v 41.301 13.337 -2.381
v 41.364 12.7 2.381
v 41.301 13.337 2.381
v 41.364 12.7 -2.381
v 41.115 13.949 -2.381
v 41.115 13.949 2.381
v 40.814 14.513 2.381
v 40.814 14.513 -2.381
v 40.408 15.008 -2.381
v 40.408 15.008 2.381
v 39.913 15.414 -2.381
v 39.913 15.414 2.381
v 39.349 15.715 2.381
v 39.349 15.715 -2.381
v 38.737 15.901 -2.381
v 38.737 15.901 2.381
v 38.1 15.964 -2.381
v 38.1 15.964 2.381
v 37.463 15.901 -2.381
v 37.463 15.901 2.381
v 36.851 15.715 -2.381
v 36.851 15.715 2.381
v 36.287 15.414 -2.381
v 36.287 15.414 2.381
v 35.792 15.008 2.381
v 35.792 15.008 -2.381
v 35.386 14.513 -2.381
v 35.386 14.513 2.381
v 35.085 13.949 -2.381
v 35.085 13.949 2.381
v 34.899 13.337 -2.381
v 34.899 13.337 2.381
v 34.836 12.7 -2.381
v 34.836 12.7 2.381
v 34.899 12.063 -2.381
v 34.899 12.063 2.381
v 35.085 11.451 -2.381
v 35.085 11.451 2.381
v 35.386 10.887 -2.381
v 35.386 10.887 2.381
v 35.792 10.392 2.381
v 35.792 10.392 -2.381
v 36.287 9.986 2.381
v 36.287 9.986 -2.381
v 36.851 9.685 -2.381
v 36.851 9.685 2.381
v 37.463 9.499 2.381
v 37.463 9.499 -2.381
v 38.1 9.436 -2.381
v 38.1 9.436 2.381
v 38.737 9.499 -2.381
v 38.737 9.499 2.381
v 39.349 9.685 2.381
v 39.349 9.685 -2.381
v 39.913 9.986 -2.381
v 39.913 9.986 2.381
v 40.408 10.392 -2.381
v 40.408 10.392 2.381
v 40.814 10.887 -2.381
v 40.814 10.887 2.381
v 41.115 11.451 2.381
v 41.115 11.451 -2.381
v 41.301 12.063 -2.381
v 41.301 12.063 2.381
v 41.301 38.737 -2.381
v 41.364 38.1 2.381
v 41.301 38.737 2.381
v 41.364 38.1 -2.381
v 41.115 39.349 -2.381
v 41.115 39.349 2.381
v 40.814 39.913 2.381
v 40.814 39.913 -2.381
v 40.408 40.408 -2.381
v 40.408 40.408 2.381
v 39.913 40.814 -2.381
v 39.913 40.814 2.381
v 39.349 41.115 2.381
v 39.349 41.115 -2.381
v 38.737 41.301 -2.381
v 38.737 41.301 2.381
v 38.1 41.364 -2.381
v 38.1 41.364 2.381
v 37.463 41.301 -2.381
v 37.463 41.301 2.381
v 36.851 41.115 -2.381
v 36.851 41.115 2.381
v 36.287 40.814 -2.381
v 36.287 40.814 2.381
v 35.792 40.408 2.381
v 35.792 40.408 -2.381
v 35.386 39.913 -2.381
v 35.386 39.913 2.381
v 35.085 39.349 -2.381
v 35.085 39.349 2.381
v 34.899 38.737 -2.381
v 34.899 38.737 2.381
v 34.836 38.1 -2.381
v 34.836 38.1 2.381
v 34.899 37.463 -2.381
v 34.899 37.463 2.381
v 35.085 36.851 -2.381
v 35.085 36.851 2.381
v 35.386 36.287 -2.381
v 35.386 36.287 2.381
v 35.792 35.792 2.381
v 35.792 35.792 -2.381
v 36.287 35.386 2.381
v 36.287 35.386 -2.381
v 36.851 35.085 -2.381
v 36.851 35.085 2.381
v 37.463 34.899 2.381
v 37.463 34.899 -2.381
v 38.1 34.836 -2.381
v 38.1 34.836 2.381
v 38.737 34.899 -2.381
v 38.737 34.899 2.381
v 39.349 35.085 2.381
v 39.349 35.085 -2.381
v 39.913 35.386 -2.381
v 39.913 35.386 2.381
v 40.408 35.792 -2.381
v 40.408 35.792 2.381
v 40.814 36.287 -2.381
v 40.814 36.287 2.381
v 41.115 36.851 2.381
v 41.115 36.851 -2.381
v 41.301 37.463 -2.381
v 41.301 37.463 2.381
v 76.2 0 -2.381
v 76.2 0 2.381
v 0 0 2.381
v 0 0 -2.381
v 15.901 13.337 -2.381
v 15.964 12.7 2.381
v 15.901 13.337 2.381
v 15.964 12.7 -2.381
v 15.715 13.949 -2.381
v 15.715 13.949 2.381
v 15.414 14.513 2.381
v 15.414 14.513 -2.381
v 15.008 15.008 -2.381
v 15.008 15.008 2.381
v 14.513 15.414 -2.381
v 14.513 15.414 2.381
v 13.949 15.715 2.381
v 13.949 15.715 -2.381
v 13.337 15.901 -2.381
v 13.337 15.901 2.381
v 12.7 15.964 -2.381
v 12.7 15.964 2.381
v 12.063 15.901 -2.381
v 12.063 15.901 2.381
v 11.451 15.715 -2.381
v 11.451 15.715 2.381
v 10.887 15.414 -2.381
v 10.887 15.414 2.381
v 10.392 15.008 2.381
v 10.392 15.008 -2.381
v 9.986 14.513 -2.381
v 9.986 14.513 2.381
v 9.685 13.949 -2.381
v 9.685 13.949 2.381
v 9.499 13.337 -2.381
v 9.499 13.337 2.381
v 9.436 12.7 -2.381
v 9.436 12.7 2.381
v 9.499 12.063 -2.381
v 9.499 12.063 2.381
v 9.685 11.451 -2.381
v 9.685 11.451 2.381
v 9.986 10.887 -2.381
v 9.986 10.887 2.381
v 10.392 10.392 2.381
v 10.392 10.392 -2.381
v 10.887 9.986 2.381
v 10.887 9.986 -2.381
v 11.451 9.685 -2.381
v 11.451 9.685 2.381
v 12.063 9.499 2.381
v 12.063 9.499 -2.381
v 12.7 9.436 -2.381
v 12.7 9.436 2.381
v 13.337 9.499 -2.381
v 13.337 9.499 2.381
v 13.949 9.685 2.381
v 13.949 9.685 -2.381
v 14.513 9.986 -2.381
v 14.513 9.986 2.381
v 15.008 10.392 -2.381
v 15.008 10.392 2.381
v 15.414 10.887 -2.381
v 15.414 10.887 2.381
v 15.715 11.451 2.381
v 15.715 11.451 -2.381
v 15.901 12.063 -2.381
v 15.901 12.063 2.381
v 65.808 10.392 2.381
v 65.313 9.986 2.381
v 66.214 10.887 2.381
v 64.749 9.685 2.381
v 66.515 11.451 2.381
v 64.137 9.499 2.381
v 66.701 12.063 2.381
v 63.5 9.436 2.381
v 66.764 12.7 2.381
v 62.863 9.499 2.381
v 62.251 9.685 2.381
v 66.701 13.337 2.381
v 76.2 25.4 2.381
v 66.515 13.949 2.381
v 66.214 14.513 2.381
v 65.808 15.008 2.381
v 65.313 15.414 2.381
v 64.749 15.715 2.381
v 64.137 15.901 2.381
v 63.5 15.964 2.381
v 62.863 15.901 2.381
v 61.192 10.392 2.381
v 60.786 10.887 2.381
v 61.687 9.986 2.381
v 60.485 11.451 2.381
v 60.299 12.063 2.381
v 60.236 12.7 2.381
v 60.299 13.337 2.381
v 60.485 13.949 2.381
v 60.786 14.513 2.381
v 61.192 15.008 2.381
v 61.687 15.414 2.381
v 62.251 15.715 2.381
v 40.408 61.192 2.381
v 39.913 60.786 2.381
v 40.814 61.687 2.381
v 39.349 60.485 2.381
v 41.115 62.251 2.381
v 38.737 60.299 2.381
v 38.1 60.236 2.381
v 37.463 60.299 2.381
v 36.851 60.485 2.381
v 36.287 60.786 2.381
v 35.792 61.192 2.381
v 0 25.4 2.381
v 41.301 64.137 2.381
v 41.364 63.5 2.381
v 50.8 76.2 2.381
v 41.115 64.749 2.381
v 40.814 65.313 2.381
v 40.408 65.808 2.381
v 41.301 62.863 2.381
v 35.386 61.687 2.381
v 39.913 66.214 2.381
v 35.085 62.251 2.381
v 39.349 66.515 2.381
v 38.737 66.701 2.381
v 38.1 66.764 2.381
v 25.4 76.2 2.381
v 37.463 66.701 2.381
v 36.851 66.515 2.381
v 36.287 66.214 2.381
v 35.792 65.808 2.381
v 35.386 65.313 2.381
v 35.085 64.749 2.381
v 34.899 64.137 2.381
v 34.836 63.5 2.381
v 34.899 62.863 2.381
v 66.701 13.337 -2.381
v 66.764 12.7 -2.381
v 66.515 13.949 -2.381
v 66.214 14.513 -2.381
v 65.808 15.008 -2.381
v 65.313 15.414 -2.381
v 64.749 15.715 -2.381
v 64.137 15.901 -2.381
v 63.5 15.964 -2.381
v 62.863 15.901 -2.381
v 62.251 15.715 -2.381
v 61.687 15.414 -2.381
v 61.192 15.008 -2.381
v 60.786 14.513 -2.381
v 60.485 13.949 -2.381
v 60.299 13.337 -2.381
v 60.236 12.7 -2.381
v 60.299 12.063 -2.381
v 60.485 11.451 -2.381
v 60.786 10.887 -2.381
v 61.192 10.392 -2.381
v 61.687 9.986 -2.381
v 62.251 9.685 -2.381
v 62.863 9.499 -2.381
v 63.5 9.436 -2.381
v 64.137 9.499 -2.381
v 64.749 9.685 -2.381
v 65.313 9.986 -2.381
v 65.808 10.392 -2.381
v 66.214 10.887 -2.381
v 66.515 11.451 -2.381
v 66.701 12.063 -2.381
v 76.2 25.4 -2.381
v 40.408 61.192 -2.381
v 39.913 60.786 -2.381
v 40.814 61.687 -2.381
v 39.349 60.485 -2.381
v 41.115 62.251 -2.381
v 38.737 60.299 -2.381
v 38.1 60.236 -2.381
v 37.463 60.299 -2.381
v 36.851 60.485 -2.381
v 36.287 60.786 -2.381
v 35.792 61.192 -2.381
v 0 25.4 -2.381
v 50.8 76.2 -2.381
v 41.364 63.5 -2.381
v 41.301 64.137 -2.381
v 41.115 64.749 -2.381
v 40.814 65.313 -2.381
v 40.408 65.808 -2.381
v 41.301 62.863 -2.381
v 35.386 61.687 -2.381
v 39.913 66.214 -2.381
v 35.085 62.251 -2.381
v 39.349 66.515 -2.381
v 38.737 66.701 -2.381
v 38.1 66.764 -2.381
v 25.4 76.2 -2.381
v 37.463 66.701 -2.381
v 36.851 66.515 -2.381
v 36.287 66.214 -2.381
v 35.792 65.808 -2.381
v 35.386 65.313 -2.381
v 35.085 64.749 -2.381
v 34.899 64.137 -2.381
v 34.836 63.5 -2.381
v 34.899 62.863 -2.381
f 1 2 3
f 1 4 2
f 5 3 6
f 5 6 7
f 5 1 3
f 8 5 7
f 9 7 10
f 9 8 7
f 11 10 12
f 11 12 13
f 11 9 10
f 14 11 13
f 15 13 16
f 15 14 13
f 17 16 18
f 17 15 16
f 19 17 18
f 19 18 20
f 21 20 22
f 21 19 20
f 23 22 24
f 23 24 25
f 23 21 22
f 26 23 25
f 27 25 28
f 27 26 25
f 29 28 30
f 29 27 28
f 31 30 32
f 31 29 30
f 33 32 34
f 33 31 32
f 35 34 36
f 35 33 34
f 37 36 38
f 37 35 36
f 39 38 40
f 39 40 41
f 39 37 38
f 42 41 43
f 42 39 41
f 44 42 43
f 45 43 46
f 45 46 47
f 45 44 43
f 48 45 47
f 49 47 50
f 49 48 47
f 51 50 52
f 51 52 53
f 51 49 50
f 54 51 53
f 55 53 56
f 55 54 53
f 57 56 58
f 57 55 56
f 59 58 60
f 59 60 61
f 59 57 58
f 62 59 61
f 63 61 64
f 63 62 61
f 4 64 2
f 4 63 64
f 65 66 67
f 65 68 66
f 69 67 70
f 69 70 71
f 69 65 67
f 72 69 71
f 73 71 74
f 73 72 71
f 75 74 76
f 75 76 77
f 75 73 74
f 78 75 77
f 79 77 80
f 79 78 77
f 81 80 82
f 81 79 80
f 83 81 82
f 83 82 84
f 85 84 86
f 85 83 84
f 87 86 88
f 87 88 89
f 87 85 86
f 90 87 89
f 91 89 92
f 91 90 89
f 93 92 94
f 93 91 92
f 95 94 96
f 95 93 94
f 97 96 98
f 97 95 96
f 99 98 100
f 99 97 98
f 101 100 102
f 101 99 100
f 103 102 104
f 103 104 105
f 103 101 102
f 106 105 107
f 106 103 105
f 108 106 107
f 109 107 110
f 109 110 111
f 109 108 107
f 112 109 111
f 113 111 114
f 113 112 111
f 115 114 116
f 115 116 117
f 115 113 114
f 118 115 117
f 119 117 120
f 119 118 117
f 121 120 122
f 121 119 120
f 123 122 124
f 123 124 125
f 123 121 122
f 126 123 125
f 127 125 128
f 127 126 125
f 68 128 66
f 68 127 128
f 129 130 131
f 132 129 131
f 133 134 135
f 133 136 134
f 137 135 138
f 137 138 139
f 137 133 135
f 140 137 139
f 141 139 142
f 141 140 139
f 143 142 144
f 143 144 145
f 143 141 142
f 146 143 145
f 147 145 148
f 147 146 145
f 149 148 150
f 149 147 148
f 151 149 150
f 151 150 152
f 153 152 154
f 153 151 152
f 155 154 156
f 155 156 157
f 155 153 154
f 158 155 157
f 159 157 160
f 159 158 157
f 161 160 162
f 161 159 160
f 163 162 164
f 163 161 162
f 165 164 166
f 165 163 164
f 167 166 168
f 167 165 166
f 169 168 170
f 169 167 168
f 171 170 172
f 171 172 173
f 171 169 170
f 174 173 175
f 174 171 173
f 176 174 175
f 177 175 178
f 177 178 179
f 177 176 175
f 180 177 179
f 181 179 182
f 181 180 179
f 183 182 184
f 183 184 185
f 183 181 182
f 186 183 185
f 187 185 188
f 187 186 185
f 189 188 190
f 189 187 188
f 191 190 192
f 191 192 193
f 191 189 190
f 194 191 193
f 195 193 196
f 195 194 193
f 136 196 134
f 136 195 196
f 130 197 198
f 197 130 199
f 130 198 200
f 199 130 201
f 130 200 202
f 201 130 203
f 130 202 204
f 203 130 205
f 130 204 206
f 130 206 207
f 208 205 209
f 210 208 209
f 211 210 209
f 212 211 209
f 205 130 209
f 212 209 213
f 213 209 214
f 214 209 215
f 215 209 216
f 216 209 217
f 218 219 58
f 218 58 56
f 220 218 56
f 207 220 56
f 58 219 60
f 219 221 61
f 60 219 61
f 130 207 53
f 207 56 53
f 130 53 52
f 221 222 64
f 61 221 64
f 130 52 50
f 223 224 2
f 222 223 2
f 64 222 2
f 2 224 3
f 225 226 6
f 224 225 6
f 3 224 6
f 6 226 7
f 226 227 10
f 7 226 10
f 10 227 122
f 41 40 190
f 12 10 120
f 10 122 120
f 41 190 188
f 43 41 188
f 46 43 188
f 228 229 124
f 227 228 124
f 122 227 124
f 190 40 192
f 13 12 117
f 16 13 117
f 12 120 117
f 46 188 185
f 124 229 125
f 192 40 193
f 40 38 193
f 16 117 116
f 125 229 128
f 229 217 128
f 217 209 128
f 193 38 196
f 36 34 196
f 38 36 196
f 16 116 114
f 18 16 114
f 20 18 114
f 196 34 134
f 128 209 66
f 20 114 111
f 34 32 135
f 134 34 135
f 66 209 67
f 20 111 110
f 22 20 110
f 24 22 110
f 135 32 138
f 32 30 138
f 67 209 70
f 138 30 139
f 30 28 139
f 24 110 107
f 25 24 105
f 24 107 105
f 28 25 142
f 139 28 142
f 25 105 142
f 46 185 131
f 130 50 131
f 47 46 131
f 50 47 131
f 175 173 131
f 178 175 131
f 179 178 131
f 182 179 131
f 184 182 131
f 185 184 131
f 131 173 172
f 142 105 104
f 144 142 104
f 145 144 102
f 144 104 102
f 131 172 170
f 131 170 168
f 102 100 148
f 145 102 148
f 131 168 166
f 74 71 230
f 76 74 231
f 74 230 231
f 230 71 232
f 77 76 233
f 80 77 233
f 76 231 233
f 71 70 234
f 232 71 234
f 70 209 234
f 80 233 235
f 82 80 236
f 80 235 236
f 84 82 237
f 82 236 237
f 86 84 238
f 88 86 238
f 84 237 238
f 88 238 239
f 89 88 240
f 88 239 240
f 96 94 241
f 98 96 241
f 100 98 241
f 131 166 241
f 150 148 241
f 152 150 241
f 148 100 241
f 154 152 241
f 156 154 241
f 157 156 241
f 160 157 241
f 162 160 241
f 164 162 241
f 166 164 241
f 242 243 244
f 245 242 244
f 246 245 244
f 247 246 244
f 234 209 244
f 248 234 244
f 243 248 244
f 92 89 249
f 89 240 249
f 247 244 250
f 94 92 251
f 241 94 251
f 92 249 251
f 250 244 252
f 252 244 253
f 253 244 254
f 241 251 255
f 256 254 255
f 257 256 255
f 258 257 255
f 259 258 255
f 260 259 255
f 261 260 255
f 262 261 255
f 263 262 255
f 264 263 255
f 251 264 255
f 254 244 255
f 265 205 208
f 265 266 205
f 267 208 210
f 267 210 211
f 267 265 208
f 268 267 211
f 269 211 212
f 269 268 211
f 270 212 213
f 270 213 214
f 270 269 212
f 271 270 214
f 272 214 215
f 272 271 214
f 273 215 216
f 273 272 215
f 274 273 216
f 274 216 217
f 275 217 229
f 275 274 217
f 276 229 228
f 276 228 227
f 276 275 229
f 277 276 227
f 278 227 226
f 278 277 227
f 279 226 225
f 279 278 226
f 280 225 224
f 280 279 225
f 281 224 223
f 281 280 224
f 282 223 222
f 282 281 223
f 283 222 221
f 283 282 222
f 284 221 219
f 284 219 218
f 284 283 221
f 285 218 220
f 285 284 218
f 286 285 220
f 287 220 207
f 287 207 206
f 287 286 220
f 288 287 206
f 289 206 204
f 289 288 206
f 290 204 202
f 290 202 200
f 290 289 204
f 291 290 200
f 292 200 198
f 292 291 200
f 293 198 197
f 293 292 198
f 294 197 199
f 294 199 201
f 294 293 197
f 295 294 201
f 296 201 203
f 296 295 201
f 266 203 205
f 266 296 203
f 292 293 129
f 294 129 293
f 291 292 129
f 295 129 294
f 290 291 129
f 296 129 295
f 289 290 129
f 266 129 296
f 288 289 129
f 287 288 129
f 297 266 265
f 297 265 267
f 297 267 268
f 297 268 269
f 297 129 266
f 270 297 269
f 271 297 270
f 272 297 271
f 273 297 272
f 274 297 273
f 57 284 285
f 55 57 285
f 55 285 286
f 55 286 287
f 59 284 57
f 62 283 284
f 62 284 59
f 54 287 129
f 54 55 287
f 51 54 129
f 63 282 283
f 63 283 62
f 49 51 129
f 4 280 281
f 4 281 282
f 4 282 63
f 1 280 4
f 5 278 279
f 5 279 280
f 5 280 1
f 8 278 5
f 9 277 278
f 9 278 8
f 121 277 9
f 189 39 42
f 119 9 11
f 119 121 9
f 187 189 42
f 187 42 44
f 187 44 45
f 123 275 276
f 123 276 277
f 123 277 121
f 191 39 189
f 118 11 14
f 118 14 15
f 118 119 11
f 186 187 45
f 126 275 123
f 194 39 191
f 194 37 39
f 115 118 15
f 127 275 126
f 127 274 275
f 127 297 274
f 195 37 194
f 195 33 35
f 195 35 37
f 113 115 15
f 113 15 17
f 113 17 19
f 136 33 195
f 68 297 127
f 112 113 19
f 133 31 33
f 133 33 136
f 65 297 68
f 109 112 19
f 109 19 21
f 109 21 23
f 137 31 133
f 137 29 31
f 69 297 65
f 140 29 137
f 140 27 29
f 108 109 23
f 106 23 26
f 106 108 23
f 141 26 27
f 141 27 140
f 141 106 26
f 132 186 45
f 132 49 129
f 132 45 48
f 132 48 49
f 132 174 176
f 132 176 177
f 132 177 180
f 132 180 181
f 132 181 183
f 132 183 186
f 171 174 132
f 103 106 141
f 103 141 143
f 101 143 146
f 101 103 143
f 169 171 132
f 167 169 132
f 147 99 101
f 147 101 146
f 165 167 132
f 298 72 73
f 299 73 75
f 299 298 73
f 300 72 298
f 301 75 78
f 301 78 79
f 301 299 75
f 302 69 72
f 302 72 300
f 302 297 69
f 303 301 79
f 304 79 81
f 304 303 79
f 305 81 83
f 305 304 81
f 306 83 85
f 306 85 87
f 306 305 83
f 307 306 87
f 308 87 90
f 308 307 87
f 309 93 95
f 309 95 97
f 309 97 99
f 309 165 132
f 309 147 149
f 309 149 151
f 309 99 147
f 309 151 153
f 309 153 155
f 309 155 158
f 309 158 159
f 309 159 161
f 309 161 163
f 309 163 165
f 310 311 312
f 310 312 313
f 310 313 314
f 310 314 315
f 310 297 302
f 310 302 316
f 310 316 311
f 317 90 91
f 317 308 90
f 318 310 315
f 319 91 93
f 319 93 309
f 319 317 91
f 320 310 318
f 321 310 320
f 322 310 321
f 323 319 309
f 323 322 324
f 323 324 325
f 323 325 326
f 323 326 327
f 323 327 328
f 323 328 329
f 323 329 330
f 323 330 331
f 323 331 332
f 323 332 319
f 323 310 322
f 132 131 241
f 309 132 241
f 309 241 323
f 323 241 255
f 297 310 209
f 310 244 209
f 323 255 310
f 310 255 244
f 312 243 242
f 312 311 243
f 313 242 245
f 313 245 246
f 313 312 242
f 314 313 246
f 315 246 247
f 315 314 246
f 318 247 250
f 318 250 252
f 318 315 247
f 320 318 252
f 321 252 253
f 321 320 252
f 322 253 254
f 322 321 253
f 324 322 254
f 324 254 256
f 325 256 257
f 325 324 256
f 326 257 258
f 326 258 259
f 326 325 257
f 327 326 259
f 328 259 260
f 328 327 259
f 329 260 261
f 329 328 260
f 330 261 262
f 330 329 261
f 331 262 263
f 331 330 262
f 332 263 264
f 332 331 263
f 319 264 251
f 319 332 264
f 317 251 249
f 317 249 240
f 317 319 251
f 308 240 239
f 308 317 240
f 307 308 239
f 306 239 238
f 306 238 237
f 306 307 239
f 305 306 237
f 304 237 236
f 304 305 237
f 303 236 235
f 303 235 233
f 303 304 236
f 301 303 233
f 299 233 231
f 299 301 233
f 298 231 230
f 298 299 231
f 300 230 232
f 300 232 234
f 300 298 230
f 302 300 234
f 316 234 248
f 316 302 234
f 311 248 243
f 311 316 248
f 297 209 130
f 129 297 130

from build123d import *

# Parameters (mm, degrees)
SKETCH1_R           = 3.2639
BOSS_EXTRUDE1_DEPTH = 2.38125


with BuildPart() as part:
    # Sketch1 → Boss-Extrude1 (new body, symmetric)
    with BuildSketch(Plane.XY):
        Polygon((0, 0), (0, 25.4), (25.4, 76.2), (50.8, 76.2), (76.2, 25.4), (76.2, 0), align=None)
        with Locations((12.7, 12.7)):
            Circle(SKETCH1_R, mode=Mode.SUBTRACT)
        with Locations((38.1, 12.7)):
            Circle(SKETCH1_R, mode=Mode.SUBTRACT)
        with Locations((63.5, 12.7)):
            Circle(SKETCH1_R, mode=Mode.SUBTRACT)
        with Locations((38.1, 38.1)):
            Circle(SKETCH1_R, mode=Mode.SUBTRACT)
        with Locations((38.1, 63.5)):
            Circle(SKETCH1_R, mode=Mode.SUBTRACT)
    extrude(amount=BOSS_EXTRUDE1_DEPTH, both=True)


solid = part.part
